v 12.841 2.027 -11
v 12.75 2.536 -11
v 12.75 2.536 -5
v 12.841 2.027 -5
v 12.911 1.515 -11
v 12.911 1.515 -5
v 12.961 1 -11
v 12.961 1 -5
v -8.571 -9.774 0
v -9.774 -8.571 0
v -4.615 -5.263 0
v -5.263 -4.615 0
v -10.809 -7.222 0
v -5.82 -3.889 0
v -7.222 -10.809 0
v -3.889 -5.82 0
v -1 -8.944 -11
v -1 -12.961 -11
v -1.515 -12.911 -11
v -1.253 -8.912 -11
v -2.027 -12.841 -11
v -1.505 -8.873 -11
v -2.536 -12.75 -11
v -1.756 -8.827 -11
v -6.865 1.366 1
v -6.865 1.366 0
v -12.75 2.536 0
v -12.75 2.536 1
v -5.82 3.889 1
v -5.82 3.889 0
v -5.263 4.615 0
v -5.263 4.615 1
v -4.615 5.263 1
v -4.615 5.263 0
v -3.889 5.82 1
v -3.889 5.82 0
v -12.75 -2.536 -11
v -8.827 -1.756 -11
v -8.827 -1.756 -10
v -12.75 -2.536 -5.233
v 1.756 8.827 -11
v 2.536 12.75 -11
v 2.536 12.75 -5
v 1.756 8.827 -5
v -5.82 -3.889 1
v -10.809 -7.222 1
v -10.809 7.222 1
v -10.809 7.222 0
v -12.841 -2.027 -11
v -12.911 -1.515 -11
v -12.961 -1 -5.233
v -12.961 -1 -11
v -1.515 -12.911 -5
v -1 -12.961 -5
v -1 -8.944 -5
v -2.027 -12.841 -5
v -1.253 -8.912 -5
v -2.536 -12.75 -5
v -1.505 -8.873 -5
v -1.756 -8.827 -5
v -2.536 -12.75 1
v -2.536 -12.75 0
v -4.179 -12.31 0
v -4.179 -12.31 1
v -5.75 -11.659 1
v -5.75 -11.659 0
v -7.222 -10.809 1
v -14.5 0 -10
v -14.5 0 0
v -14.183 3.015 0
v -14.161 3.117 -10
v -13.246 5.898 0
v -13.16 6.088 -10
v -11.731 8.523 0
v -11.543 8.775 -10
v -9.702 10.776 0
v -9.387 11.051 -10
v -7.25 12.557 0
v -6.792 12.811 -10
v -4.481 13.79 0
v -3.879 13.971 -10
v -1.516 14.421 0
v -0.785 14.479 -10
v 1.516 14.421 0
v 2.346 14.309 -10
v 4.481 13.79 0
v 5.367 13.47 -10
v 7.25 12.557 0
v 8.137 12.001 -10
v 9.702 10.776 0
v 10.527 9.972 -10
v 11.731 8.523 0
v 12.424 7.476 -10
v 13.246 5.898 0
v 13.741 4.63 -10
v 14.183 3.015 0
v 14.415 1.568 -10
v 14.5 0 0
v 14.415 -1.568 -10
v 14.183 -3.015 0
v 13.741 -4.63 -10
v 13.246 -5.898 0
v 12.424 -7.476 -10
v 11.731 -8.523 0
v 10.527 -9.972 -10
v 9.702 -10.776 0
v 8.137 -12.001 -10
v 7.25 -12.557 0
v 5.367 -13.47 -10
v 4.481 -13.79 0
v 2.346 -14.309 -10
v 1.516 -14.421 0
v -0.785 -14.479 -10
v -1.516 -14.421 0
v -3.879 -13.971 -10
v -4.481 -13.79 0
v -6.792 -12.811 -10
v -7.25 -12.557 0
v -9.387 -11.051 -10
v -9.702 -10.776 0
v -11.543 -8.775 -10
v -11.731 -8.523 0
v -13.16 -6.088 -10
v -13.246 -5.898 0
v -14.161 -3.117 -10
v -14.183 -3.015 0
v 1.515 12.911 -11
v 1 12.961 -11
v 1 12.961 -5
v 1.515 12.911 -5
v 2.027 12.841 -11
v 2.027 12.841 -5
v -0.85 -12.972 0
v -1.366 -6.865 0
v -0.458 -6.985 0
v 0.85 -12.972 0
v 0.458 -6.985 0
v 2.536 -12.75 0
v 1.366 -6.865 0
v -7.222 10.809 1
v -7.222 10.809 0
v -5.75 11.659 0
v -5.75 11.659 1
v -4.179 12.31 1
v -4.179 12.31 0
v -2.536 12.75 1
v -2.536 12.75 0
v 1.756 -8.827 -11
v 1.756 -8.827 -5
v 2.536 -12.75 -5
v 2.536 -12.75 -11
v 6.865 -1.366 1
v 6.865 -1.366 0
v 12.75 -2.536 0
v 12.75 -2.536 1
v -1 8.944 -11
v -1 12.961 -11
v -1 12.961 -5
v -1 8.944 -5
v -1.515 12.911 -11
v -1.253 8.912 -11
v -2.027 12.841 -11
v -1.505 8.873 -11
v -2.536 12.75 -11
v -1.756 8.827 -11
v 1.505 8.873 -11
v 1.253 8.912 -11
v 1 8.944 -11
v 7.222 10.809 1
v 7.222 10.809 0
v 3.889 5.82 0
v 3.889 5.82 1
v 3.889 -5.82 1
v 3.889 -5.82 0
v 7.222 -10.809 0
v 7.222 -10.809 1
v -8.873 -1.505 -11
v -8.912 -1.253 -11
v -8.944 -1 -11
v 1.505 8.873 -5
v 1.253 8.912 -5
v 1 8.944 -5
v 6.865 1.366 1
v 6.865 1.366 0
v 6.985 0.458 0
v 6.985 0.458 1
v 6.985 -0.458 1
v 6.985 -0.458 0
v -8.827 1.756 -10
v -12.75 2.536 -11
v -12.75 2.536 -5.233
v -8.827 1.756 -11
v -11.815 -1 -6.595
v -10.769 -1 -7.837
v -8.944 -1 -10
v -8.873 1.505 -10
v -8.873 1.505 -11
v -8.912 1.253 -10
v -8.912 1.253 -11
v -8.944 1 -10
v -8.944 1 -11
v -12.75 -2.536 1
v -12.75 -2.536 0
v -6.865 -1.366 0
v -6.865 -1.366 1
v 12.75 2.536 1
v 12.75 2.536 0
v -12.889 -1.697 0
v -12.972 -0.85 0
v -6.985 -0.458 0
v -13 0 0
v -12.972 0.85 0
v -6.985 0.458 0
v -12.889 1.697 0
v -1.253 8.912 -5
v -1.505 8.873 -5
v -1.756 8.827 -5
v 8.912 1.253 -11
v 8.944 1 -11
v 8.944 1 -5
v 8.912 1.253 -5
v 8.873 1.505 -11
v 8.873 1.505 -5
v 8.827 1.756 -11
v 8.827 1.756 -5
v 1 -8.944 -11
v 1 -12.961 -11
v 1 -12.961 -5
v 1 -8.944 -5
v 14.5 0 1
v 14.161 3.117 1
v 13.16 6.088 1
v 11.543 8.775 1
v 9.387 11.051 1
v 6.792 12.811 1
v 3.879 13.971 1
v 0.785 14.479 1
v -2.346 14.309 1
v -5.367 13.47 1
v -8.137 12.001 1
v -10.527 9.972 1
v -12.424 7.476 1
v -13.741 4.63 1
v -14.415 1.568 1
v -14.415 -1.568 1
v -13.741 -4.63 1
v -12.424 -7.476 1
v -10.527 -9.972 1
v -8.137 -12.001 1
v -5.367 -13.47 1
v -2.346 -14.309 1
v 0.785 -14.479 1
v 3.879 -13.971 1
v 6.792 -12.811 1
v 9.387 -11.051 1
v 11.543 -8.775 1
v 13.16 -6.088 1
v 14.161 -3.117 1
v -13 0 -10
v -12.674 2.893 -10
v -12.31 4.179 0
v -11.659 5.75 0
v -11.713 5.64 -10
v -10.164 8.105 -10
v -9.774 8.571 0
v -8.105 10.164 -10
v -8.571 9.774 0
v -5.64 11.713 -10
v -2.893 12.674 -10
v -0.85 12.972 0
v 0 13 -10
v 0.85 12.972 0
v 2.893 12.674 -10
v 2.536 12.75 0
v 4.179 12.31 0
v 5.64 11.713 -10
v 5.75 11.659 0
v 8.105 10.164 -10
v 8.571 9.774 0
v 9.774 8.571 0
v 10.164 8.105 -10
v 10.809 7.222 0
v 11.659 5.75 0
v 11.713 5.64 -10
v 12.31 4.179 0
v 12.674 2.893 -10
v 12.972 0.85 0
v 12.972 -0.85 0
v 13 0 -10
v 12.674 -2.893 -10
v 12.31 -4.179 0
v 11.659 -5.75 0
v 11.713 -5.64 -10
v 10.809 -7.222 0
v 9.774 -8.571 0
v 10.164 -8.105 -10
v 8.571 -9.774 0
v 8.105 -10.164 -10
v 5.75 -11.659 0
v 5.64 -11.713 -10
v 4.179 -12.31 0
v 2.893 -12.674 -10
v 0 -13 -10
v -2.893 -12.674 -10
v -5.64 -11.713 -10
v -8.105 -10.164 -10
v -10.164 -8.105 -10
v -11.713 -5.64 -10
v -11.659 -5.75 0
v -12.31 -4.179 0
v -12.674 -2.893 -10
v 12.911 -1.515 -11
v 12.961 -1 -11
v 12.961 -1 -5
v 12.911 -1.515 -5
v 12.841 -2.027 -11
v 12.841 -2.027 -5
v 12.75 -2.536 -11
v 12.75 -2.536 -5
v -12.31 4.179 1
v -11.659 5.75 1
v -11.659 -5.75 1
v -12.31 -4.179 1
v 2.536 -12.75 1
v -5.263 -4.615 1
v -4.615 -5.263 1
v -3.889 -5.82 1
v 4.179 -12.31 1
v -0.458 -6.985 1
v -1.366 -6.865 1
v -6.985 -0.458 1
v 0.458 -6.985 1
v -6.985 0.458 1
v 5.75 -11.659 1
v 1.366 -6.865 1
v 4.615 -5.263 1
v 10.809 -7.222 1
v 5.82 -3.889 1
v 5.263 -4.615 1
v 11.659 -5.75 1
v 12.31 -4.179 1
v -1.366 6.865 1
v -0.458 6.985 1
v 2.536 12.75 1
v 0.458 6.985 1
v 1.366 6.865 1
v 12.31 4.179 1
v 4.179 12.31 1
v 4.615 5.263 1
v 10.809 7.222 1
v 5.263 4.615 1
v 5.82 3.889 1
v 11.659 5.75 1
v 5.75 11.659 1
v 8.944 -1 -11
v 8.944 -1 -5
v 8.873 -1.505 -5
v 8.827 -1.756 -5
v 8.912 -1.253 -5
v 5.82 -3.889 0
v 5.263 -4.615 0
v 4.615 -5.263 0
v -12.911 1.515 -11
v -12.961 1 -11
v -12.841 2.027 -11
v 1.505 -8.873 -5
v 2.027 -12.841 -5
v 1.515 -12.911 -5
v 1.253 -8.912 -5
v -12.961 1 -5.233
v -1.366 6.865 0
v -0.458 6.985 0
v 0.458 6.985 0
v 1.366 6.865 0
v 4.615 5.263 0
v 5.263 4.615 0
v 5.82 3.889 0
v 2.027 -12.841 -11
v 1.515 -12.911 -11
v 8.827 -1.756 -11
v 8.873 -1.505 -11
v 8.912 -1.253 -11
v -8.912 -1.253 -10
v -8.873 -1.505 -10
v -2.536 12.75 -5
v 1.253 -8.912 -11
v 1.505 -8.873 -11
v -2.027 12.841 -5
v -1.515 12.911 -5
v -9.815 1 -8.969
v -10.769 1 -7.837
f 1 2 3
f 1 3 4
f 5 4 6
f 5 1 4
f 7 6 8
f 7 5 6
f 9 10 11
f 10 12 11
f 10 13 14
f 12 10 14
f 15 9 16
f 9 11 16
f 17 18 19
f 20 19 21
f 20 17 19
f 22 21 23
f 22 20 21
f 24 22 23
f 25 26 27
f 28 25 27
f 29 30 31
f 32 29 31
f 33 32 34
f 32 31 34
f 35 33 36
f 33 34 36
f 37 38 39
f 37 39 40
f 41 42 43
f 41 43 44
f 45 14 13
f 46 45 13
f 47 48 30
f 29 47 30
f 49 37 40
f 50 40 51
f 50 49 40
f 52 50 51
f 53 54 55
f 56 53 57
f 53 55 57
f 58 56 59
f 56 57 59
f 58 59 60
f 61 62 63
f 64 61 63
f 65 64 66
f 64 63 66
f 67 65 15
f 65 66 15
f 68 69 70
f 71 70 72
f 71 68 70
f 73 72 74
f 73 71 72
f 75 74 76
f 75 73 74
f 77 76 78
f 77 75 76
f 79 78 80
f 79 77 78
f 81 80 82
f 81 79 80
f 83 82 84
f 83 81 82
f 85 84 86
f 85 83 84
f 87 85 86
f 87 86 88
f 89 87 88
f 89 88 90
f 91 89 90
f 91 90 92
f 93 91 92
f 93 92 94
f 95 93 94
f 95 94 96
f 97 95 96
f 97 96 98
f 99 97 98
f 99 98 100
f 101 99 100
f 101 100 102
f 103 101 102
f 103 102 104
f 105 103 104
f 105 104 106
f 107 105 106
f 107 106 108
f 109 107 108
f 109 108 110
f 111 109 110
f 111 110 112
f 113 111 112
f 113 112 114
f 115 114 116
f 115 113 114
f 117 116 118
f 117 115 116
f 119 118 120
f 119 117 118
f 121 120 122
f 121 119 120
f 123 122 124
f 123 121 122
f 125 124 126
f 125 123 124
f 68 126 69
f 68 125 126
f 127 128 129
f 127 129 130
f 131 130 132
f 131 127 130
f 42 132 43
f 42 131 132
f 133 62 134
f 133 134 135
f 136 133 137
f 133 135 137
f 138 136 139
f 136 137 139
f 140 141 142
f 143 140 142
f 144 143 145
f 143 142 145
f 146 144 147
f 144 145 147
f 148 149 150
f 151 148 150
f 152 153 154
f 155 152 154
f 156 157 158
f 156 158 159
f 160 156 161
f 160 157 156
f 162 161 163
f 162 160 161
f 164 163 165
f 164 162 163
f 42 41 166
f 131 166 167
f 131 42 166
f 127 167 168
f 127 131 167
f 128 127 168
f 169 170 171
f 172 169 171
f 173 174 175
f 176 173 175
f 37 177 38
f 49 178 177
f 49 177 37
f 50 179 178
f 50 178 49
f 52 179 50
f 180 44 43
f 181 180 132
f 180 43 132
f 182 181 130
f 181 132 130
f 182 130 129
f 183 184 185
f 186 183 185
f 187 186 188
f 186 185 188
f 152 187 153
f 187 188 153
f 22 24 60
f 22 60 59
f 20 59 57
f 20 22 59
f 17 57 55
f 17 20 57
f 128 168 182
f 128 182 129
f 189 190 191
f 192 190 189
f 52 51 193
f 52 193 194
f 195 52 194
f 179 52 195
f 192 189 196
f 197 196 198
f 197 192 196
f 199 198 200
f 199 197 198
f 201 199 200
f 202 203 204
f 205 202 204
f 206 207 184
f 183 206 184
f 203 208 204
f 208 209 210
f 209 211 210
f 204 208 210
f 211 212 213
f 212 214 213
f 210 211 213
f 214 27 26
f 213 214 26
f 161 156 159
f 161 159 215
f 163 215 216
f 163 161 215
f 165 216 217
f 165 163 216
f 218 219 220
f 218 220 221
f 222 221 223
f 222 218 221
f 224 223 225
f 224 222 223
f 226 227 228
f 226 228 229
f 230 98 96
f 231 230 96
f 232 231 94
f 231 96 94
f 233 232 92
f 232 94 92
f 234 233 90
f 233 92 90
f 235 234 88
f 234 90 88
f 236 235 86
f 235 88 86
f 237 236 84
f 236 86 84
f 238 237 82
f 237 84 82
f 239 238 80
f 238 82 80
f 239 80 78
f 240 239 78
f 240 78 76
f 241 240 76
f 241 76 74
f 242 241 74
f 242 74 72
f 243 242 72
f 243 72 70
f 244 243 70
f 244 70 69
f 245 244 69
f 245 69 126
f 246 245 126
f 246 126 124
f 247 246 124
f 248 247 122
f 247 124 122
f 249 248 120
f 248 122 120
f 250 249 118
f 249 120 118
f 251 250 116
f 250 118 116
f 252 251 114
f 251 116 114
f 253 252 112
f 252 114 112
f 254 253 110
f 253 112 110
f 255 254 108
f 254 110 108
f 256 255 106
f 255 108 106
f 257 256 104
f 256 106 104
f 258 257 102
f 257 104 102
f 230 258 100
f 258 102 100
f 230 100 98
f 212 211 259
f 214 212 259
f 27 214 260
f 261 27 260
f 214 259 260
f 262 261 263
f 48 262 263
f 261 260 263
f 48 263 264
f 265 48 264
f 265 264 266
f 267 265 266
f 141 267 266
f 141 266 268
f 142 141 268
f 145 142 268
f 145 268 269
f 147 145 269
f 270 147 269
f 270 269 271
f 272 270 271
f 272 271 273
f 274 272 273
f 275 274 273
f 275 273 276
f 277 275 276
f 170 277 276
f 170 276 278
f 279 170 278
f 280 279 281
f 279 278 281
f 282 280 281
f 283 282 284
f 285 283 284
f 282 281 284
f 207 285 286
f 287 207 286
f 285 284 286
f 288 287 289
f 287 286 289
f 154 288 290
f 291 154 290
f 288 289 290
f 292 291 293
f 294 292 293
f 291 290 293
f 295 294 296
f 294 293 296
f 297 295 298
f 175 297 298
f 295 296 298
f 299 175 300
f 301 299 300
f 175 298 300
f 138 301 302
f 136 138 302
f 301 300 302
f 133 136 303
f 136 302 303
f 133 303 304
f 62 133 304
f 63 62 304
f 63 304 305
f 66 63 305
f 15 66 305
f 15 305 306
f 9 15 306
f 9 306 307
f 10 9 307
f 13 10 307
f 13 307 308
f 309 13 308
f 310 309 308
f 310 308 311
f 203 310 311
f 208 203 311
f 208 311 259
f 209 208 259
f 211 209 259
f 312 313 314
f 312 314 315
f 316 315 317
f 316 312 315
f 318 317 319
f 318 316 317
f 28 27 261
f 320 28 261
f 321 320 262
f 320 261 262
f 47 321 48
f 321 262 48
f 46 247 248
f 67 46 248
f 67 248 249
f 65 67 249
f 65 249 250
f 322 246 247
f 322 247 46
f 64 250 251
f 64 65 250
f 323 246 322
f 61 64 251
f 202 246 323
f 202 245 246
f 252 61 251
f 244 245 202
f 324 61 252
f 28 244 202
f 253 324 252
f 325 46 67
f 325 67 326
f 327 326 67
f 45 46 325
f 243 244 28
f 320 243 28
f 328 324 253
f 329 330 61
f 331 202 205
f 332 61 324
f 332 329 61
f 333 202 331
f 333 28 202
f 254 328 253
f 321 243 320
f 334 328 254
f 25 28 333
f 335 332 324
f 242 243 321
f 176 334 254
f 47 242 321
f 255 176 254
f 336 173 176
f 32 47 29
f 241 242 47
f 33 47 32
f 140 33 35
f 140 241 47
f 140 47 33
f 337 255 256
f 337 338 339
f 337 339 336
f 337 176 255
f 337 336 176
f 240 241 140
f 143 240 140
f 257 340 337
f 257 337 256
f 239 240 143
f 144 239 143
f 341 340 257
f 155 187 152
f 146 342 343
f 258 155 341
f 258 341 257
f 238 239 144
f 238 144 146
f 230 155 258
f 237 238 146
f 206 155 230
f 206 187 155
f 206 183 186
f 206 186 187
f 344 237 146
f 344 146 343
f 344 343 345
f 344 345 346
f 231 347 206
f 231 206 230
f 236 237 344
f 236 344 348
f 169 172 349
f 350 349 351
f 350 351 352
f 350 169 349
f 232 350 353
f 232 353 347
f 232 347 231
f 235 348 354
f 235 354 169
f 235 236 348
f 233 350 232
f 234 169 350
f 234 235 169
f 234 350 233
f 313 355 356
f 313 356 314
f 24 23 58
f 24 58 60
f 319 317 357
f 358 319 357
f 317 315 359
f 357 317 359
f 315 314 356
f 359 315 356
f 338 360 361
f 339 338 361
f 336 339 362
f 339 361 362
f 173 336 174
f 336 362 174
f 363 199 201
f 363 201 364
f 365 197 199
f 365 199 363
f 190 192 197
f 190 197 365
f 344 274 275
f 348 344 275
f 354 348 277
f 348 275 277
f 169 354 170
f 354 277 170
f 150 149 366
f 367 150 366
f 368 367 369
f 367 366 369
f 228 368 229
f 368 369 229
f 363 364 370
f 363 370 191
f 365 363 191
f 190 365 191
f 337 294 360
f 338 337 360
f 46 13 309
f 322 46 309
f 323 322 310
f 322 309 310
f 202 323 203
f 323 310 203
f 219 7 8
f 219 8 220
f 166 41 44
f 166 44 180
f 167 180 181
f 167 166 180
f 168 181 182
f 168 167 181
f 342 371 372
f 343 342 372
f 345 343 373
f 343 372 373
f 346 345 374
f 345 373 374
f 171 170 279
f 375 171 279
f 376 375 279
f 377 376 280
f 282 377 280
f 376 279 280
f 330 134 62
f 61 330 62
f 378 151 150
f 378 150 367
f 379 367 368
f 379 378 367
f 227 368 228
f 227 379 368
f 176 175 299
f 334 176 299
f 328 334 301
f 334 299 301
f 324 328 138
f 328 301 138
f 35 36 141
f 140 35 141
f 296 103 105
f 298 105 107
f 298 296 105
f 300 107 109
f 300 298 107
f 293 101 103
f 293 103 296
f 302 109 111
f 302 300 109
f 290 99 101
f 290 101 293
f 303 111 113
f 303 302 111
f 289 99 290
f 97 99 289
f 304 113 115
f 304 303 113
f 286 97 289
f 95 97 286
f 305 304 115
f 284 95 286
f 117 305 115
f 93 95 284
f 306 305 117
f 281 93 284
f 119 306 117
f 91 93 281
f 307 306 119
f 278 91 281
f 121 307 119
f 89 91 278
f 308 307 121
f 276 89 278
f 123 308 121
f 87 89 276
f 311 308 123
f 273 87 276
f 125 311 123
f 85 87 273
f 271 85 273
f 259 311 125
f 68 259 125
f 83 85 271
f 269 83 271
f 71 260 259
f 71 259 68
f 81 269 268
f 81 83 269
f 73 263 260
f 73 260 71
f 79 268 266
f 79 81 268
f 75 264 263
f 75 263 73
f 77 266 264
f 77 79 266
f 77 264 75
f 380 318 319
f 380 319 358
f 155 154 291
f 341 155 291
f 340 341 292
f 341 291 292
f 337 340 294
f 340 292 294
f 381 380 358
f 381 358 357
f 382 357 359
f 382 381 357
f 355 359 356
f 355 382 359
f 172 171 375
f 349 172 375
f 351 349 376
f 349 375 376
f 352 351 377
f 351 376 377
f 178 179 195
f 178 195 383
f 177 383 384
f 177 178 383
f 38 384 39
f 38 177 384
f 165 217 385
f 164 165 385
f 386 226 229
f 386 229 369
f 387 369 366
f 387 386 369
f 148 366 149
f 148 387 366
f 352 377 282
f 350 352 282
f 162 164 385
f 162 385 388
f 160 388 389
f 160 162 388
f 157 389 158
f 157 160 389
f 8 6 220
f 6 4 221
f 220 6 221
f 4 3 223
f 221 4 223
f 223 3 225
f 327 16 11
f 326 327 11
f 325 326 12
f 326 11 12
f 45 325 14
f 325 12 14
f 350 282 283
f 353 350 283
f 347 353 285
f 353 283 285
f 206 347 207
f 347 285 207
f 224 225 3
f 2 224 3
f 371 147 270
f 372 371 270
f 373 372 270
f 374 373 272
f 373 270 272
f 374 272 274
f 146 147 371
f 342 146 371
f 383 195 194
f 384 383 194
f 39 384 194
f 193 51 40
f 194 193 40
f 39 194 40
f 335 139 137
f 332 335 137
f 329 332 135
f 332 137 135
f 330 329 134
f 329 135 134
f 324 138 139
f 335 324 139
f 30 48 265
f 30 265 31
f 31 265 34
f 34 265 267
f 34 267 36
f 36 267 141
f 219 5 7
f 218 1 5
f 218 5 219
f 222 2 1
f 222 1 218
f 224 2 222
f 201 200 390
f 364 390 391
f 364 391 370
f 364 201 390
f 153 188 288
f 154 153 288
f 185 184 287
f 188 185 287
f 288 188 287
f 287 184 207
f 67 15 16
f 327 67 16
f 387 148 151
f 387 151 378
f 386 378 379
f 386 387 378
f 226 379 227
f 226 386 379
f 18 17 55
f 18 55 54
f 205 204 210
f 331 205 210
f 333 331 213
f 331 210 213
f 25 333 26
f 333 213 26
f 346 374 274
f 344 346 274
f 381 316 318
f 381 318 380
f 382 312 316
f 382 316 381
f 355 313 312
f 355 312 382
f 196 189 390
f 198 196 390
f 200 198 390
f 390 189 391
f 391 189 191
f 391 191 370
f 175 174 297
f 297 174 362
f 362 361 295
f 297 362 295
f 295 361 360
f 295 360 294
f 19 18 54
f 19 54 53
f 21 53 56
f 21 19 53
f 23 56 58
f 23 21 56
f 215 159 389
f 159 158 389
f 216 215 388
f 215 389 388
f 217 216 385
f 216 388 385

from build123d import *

# Parameters (mm, degrees)
SKETCH1_R             = 14.5
BOSS_EXTRUDE1_DEPTH   = 1
BOSS_EXTRUDE2_START   = 6
BOSS_EXTRUDE2_DEPTH   = 6
BOSS_EXTRUDE2_2_DEPTH = 6
BOSS_EXTRUDE2_3_DEPTH = 6
BOSS_EXTRUDE2_4_DEPTH = 6
BOSS_EXTRUDE2_5_DEPTH = 6
BOSS_EXTRUDE2_6_DEPTH = 6
BOSS_EXTRUDE2_7_DEPTH = 6
BOSS_EXTRUDE2_8_DEPTH = 6
BOSS_EXTRUDE3_START   = 10
SKETCH3_R             = 14.5
SKETCH3_R_2           = 13
BOSS_EXTRUDE3_DEPTH   = 10
CHAMFER1_SIZE         = 5
CHAMFER1_SIZE_2       = 4.195498156
CHAMFER2_SIZE         = 5
CHAMFER2_SIZE_2       = 4.195498156


with BuildPart() as part:
    # Sketch1 → Boss-Extrude1 (new body)
    with BuildSketch(Plane.XY):
        Circle(SKETCH1_R)
        with BuildLine():
            ThreePointArc((-1.365632254, 6.865496963), (0, 7), (1.365632254, 6.865496963))
            Line((1.365632254, 6.865496963), (2.536174186, 12.750208645))
            ThreePointArc((2.536174186, 12.750208645), (4.974884621, 12.010433923), (7.222413029, 10.80910496))
            Line((7.222413029, 10.80910496), (3.888991631, 5.820287286))
            ThreePointArc((3.888991631, 5.820287286), (4.949747468, 4.949747468), (5.820287286, 3.888991631))
            Line((5.820287286, 3.888991631), (10.80910496, 7.222413029))
            ThreePointArc((10.80910496, 7.222413029), (12.010433923, 4.974884621), (12.750208645, 2.536174186))
            Line((12.750208645, 2.536174186), (6.865496963, 1.365632254))
            ThreePointArc((6.865496963, 1.365632254), (7, 0), (6.865496963, -1.365632254))
            Line((6.865496963, -1.365632254), (12.750208645, -2.536174186))
            ThreePointArc((12.750208645, -2.536174186), (12.010433923, -4.974884621), (10.80910496, -7.222413029))
            Line((10.80910496, -7.222413029), (5.820287286, -3.888991631))
            ThreePointArc((5.820287286, -3.888991631), (4.949747468, -4.949747468), (3.888991631, -5.820287286))
            Line((3.888991631, -5.820287286), (7.222413029, -10.80910496))
            ThreePointArc((7.222413029, -10.80910496), (4.974884621, -12.010433923), (2.536174186, -12.750208645))
            Line((2.536174186, -12.750208645), (1.365632254, -6.865496963))
            ThreePointArc((1.365632254, -6.865496963), (0, -7), (-1.365632254, -6.865496963))
            Line((-1.365632254, -6.865496963), (-2.536174186, -12.750208645))
            ThreePointArc((-2.536174186, -12.750208645), (-4.974884621, -12.010433923), (-7.222413029, -10.80910496))
            Line((-7.222413029, -10.80910496), (-3.888991631, -5.820287286))
            ThreePointArc((-3.888991631, -5.820287286), (-4.949747468, -4.949747468), (-5.820287286, -3.888991631))
            Line((-5.820287286, -3.888991631), (-10.80910496, -7.222413029))
            ThreePointArc((-10.80910496, -7.222413029), (-12.010433923, -4.974884621), (-12.750208645, -2.536174186))
            Line((-12.750208645, -2.536174186), (-6.865496963, -1.365632254))
            ThreePointArc((-6.865496963, -1.365632254), (-7, 0), (-6.865496963, 1.365632254))
            Line((-6.865496963, 1.365632254), (-12.750208645, 2.536174186))
            ThreePointArc((-12.750208645, 2.536174186), (-12.010433923, 4.974884621), (-10.80910496, 7.222413029))
            Line((-10.80910496, 7.222413029), (-5.820287286, 3.888991631))
            ThreePointArc((-5.820287286, 3.888991631), (-4.949747468, 4.949747468), (-3.888991631, 5.820287286))
            Line((-3.888991631, 5.820287286), (-7.222413029, 10.80910496))
            ThreePointArc((-7.222413029, 10.80910496), (-4.974884621, 12.010433923), (-2.536174186, 12.750208645))
            Line((-2.536174186, 12.750208645), (-1.365632254, 6.865496963))
        make_face(mode=Mode.SUBTRACT)
    extrude(amount=BOSS_EXTRUDE1_DEPTH)

    # Sketch3 → Boss-Extrude3 (add)
    with BuildSketch(Plane(origin=(0, 0, 0), x_dir=(-1, 0, 0), z_dir=(0, 0, -1)).offset(BOSS_EXTRUDE3_START)):
        Circle(SKETCH3_R)
        Circle(SKETCH3_R_2, mode=Mode.SUBTRACT)
    extrude(amount=-BOSS_EXTRUDE3_DEPTH)


with BuildPart() as body_2:
    # Sketch2 → Boss-Extrude2 (new body)
    with BuildSketch(Plane(origin=(0, 0, -5), x_dir=(-1, 0, 0), z_dir=(0, 0, -1)).offset(BOSS_EXTRUDE2_START)):
        with BuildLine():
            ThreePointArc((1, 8.94427191), (1.379152058, 8.893702244), (1.755812898, 8.827067524))
            Line((1.755812898, 8.827067524), (2.536174186, 12.750208645))
            ThreePointArc((2.536174186, 12.750208645), (1.771239965, 12.8787697), (1, 12.961481397))
            Line((1, 12.961481397), (1, 8.94427191))
        make_face()
    extrude(amount=-BOSS_EXTRUDE2_DEPTH)


with BuildPart() as body_3:
    # Sketch2 → Boss-Extrude2 2 (new body)
    with BuildSketch(Plane(origin=(0, 0, -5), x_dir=(-1, 0, 0), z_dir=(0, 0, -1)).offset(BOSS_EXTRUDE2_START)):
        with BuildLine():
            ThreePointArc((-1.755812898, 8.827067524), (-1.379152058, 8.893702244), (-1, 8.94427191))
            Line((-1, 8.94427191), (-1, 12.961481397))
            ThreePointArc((-1, 12.961481397), (-1.771239965, 12.8787697), (-2.536174186, 12.750208645))
            Line((-2.536174186, 12.750208645), (-1.755812898, 8.827067524))
        make_face()
    extrude(amount=-BOSS_EXTRUDE2_2_DEPTH)


with BuildPart() as body_4:
    # Sketch2 → Boss-Extrude2 3 (new body)
    with BuildSketch(Plane(origin=(0, 0, -5), x_dir=(-1, 0, 0), z_dir=(0, 0, -1)).offset(BOSS_EXTRUDE2_START)):
        with BuildLine():
            ThreePointArc((-8.94427191, 1), (-8.893702244, 1.379152058), (-8.827067524, 1.755812898))
            Line((-8.827067524, 1.755812898), (-12.750208645, 2.536174186))
            ThreePointArc((-12.750208645, 2.536174186), (-12.8787697, 1.771239965), (-12.961481397, 1))
            Line((-12.961481397, 1), (-8.94427191, 1))
        make_face()
    extrude(amount=-BOSS_EXTRUDE2_3_DEPTH)


with BuildPart() as body_5:
    # Sketch2 → Boss-Extrude2 4 (new body)
    with BuildSketch(Plane(origin=(0, 0, -5), x_dir=(-1, 0, 0), z_dir=(0, 0, -1)).offset(BOSS_EXTRUDE2_START)):
        with BuildLine():
            ThreePointArc((-8.827067524, -1.755812898), (-8.893702244, -1.379152058), (-8.94427191, -1))
            Line((-8.94427191, -1), (-12.961481397, -1))
            ThreePointArc((-12.961481397, -1), (-12.8787697, -1.771239965), (-12.750208645, -2.536174186))
            Line((-12.750208645, -2.536174186), (-8.827067524, -1.755812898))
        make_face()
    extrude(amount=-BOSS_EXTRUDE2_4_DEPTH)


with BuildPart() as body_6:
    # Sketch2 → Boss-Extrude2 5 (new body)
    with BuildSketch(Plane(origin=(0, 0, -5), x_dir=(-1, 0, 0), z_dir=(0, 0, -1)).offset(BOSS_EXTRUDE2_START)):
        with BuildLine():
            Line((-1, -12.961481397), (-1, -8.94427191))
            ThreePointArc((-1, -8.94427191), (-1.379152058, -8.893702244), (-1.755812898, -8.827067524))
            Line((-1.755812898, -8.827067524), (-2.536174186, -12.750208645))
            ThreePointArc((-2.536174186, -12.750208645), (-1.771239965, -12.8787697), (-1, -12.961481397))
        make_face()
    extrude(amount=-BOSS_EXTRUDE2_5_DEPTH)


with BuildPart() as body_7:
    # Sketch2 → Boss-Extrude2 6 (new body)
    with BuildSketch(Plane(origin=(0, 0, -5), x_dir=(-1, 0, 0), z_dir=(0, 0, -1)).offset(BOSS_EXTRUDE2_START)):
        with BuildLine():
            Line((2.536174186, -12.750208645), (1.755812898, -8.827067524))
            ThreePointArc((1.755812898, -8.827067524), (1.379152058, -8.893702244), (1, -8.94427191))
            Line((1, -8.94427191), (1, -12.961481397))
            ThreePointArc((1, -12.961481397), (1.771239965, -12.8787697), (2.536174186, -12.750208645))
        make_face()
    extrude(amount=-BOSS_EXTRUDE2_6_DEPTH)


with BuildPart() as body_8:
    # Sketch2 → Boss-Extrude2 7 (new body)
    with BuildSketch(Plane(origin=(0, 0, -5), x_dir=(-1, 0, 0), z_dir=(0, 0, -1)).offset(BOSS_EXTRUDE2_START)):
        with BuildLine():
            Line((12.961481397, -1), (8.94427191, -1))
            ThreePointArc((8.94427191, -1), (8.893702244, -1.379152058), (8.827067524, -1.755812898))
            Line((8.827067524, -1.755812898), (12.750208645, -2.536174186))
            ThreePointArc((12.750208645, -2.536174186), (12.8787697, -1.771239965), (12.961481397, -1))
        make_face()
    extrude(amount=-BOSS_EXTRUDE2_7_DEPTH)

    # Chamfer1
    # the kernel refuses this chamfer: 5, 4.195498156 mm, written as the material it takes off along each edge
    with BuildSketch(Plane(origin=(0, 0, -5), x_dir=(-0.24763976324851328, 0.9688521804992858, 0), z_dir=(0.9688521804992858, 0.24763976324851328, 0))) as chamfer1_piece_1:
        Polygon((9, -CHAMFER1_SIZE), (9 + CHAMFER1_SIZE_2, 0), (9, 0), align=None)
    revolve(axis=Axis((0, 0, -5), (0, 0, 1)), revolution_arc=168.953591464, mode=Mode.SUBTRACT)


with BuildPart() as body_9:
    # Sketch2 → Boss-Extrude2 8 (new body)
    with BuildSketch(Plane(origin=(0, 0, -5), x_dir=(-1, 0, 0), z_dir=(0, 0, -1)).offset(BOSS_EXTRUDE2_START)):
        with BuildLine():
            Line((12.750208645, 2.536174186), (8.827067524, 1.755812898))
            ThreePointArc((8.827067524, 1.755812898), (8.893702244, 1.379152058), (8.94427191, 1))
            Line((8.94427191, 1), (12.961481397, 1))
            ThreePointArc((12.961481397, 1), (12.8787697, 1.771239965), (12.750208645, 2.536174186))
        make_face()
    extrude(amount=-BOSS_EXTRUDE2_8_DEPTH)

    # Chamfer2
    # the kernel refuses this chamfer: 5, 4.195498156 mm, written as the material it takes off along each edge
    with BuildSketch(Plane(origin=(0, 0, -5), x_dir=(0.05741558541416482, 0.9983503646273431, 0), z_dir=(0.9983503646273431, -0.05741558541416482, 0))) as chamfer2_piece_1:
        Polygon((9, -CHAMFER2_SIZE), (9 + CHAMFER2_SIZE_2, 0), (9, 0), align=None)
    revolve(axis=Axis((0, 0, -5), (0, 0, 1)), revolution_arc=168.953591464, mode=Mode.SUBTRACT)


solid = Compound([part.part, body_2.part, body_3.part, body_4.part, body_5.part, body_6.part, body_7.part, body_8.part, body_9.part])
